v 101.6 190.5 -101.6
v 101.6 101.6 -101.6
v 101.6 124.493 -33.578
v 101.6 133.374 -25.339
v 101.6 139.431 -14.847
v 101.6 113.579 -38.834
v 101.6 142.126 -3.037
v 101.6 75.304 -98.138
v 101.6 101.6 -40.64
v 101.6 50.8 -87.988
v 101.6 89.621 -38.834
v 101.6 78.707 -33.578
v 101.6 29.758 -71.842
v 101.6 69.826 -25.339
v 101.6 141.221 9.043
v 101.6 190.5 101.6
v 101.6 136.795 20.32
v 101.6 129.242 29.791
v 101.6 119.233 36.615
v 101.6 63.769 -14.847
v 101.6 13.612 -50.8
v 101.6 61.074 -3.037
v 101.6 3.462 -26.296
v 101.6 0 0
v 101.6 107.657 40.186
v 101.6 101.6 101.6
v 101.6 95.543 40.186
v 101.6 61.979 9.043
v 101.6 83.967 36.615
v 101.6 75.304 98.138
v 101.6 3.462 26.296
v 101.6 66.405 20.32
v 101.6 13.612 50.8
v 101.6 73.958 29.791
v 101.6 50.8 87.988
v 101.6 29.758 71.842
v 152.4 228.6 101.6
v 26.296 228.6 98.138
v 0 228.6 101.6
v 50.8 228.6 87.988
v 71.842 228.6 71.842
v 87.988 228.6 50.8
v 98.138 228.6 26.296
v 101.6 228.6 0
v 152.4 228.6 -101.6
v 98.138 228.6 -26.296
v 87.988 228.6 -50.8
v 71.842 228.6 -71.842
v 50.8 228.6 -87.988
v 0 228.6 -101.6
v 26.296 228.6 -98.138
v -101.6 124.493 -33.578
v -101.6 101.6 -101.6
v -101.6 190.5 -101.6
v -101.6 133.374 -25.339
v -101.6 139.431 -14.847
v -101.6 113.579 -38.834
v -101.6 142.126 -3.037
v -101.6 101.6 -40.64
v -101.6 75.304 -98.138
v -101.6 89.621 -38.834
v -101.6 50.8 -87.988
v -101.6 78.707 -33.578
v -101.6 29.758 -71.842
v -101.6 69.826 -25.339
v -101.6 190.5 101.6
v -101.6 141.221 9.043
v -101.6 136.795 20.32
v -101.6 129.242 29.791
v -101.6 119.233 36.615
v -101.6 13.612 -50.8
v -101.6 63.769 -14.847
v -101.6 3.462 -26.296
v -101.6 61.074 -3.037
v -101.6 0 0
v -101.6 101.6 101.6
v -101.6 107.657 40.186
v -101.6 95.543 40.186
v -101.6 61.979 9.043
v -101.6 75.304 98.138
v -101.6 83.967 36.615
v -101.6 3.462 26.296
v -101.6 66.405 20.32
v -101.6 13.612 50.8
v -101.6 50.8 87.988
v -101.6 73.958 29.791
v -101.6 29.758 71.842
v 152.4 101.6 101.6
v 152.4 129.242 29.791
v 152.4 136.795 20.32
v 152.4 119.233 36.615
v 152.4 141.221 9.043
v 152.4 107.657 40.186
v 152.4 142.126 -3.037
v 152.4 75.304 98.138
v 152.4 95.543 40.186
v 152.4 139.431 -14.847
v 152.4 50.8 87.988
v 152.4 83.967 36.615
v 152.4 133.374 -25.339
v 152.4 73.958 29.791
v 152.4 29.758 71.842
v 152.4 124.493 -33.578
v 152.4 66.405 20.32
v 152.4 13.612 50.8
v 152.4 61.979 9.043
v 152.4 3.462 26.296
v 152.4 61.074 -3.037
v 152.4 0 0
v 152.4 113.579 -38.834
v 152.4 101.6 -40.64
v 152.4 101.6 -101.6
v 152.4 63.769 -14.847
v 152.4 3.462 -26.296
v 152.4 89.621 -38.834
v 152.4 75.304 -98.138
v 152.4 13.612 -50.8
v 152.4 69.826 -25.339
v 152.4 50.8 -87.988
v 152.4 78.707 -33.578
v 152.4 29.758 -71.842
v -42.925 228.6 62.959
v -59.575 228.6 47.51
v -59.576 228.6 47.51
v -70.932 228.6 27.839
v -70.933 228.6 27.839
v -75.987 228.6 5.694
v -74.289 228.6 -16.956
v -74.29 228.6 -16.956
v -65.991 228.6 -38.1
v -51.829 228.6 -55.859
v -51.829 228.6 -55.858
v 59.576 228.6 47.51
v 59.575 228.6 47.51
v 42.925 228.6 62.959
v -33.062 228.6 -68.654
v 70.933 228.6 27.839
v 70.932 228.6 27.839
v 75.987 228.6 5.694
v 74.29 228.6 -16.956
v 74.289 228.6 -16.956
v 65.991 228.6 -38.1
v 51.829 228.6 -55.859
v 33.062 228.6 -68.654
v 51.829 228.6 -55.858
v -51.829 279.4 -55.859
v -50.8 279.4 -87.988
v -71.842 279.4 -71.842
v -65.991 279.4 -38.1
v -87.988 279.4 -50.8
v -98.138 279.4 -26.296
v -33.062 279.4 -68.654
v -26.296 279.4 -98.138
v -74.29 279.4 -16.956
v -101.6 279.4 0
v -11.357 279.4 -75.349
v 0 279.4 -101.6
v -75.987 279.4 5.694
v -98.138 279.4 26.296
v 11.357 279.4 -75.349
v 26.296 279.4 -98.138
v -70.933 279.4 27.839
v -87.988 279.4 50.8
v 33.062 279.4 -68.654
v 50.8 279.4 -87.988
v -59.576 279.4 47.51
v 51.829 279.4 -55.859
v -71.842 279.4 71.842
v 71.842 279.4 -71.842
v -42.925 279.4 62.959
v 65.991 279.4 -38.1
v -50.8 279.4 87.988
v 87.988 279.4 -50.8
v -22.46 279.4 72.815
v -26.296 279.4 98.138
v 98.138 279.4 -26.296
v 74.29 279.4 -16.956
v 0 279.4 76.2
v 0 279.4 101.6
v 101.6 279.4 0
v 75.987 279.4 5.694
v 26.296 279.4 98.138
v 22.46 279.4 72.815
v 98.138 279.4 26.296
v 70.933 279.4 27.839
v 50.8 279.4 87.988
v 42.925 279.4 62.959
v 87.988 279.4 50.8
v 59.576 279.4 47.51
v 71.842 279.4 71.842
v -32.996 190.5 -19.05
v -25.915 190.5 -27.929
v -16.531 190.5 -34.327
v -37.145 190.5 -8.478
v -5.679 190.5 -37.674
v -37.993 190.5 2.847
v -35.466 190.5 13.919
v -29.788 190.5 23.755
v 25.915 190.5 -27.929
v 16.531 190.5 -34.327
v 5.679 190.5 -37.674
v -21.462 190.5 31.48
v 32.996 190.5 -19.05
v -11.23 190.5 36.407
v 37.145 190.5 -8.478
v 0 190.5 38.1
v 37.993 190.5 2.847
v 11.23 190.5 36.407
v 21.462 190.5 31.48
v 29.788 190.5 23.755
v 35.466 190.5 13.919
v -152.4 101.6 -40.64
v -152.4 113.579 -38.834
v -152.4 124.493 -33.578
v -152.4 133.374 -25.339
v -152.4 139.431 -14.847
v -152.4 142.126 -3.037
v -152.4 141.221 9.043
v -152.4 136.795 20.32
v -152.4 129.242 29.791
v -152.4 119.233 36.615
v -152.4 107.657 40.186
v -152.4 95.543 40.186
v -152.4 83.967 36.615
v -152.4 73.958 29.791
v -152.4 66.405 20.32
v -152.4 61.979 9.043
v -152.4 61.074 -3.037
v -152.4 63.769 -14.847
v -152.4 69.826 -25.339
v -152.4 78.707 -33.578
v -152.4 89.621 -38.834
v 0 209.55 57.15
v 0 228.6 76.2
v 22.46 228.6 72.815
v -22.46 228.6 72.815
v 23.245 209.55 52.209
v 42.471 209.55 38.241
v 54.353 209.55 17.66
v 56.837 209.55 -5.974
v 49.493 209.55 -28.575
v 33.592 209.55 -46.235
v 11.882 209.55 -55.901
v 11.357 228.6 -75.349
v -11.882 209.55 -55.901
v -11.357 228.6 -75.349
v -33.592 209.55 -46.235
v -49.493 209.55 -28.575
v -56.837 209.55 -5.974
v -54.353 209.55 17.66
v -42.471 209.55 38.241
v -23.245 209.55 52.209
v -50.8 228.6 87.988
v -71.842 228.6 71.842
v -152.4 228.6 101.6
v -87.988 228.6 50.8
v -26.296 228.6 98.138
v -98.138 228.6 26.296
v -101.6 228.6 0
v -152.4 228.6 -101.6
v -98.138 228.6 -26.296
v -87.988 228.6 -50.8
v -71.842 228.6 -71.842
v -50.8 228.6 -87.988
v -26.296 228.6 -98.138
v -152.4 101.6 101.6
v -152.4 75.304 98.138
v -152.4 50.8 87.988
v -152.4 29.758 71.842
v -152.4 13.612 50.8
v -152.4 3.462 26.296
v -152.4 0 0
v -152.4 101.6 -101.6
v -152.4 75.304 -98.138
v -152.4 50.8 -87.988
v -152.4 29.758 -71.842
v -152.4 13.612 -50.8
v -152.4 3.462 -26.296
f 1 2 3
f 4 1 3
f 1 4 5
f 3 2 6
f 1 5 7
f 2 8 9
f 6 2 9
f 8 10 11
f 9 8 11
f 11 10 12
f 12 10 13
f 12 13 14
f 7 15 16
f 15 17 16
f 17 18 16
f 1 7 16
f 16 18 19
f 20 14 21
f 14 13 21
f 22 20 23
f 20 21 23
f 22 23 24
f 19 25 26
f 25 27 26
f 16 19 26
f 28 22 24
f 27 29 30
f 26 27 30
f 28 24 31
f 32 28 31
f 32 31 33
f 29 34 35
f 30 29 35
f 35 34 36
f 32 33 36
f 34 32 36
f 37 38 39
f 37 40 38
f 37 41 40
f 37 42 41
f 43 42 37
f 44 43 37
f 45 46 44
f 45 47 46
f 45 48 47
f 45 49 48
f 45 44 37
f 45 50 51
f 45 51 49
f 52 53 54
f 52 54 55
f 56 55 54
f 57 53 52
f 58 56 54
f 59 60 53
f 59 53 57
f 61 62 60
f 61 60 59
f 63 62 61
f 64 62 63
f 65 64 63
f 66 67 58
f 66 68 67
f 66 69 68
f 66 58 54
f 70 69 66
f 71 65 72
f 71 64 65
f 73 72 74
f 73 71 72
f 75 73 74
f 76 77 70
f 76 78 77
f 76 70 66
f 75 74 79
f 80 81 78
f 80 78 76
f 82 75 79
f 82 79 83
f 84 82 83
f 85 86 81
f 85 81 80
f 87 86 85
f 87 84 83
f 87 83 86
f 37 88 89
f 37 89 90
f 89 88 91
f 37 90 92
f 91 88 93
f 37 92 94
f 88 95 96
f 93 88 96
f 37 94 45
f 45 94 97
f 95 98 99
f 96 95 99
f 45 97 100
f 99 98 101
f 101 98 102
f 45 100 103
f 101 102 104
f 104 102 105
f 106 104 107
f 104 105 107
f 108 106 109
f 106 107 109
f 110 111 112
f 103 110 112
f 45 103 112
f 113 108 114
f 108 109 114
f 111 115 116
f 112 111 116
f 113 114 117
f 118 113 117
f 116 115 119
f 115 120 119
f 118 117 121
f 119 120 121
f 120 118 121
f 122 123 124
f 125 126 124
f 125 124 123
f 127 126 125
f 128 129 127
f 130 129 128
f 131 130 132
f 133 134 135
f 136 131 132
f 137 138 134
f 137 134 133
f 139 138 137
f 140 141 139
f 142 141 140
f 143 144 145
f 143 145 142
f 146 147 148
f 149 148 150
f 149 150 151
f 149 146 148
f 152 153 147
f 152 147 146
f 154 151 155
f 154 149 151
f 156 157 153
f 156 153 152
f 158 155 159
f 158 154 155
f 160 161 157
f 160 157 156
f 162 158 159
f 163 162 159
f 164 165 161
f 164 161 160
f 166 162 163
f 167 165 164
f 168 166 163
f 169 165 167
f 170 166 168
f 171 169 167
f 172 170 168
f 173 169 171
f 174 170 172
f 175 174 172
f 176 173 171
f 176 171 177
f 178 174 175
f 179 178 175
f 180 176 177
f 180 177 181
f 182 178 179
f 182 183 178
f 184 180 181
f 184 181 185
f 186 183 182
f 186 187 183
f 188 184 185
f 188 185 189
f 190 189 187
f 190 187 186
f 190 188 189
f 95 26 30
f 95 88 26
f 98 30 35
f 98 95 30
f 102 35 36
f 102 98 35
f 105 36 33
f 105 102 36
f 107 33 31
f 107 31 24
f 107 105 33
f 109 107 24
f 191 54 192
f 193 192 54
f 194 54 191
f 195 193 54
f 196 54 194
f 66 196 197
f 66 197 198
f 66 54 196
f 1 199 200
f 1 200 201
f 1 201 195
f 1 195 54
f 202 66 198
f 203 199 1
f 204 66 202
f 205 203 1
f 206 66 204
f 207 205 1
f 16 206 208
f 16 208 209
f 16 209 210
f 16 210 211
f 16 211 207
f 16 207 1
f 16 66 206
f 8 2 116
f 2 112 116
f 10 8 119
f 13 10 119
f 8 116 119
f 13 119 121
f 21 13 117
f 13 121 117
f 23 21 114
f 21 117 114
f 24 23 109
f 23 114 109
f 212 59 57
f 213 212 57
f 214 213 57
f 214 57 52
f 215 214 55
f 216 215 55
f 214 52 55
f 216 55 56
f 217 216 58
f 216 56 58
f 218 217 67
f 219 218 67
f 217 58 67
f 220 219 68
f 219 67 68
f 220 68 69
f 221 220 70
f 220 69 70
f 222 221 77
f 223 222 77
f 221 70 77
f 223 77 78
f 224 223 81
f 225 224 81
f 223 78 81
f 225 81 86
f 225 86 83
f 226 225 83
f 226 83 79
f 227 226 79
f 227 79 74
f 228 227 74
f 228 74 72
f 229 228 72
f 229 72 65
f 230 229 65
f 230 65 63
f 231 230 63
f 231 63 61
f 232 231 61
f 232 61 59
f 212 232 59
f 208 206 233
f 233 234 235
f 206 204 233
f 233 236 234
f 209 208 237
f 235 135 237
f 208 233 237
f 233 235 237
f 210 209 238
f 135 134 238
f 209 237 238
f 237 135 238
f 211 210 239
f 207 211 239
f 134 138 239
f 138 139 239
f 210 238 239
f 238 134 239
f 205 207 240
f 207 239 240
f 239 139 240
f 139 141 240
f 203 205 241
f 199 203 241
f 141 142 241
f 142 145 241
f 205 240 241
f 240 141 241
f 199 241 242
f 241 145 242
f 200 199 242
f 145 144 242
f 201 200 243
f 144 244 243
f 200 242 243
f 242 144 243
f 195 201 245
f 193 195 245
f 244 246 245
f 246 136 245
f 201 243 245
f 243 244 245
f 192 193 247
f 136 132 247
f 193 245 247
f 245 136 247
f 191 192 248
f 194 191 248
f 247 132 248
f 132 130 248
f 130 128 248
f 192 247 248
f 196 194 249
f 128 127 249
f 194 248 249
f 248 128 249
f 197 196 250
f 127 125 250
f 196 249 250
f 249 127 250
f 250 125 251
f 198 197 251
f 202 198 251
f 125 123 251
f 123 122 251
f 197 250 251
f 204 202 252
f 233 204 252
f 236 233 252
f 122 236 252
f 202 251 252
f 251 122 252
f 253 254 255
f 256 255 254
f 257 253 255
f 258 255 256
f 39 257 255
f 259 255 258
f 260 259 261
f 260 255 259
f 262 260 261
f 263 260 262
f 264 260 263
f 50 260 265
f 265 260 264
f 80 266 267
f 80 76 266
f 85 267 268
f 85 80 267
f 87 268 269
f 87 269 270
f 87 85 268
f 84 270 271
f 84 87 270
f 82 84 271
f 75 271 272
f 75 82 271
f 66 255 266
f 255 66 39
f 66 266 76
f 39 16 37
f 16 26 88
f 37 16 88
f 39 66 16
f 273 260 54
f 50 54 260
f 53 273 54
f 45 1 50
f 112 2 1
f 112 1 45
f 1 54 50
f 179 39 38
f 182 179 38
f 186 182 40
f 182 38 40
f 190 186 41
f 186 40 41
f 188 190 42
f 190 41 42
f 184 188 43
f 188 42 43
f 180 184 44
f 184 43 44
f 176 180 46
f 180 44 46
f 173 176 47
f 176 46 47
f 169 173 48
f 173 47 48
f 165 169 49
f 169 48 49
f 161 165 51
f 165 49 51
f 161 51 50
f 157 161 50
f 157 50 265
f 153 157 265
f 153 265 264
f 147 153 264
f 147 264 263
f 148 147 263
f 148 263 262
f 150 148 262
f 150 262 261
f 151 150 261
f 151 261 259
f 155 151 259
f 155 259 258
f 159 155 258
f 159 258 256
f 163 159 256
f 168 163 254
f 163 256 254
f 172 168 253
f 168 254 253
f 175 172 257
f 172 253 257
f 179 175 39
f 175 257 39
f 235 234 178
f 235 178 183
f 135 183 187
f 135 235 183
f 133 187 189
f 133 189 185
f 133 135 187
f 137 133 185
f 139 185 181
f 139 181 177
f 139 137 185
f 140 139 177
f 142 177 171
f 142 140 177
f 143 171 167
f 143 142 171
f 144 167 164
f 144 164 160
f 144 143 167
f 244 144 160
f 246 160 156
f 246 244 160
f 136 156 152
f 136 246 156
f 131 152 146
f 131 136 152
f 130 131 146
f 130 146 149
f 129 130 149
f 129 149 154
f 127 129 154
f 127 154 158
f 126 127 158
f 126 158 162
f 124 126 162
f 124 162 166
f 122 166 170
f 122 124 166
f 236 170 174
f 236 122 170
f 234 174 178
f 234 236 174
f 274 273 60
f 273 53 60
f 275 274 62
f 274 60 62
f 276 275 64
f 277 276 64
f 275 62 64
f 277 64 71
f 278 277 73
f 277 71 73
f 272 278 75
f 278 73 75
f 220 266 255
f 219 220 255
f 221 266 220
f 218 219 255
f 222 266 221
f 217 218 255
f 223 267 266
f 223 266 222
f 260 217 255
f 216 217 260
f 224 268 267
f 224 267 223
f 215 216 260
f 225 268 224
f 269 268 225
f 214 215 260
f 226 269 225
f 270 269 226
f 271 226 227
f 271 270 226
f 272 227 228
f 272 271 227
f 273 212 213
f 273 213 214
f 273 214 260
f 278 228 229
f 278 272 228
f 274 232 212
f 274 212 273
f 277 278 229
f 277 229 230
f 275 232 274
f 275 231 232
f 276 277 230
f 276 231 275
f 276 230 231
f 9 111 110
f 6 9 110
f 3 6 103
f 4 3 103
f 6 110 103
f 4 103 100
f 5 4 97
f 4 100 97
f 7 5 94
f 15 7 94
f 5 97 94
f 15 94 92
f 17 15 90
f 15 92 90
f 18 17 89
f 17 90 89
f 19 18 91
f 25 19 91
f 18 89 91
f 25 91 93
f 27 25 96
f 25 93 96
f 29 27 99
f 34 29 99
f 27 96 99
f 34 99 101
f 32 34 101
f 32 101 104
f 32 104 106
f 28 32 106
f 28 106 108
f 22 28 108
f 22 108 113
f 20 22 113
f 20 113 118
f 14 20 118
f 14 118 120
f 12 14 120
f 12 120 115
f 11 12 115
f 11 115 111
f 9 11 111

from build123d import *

# Parameters (mm, degrees)
SKETCH1_W           = 304.8
SKETCH1_H           = 203.2
BOSS_EXTRUDE1_DEPTH = 228.6
SKETCH2_R           = 101.6
SKETCH2_R_2         = 76.2
BOSS_EXTRUDE2_DEPTH = 50.8
SKETCH3_R           = 38.1
CUT_EXTRUDE1_DEPTH  = 38.1
SKETCH4_W           = 203.2
SKETCH4_H           = 203.2
CUT_EXTRUDE2_DEPTH  = 190.5
SKETCH5_R           = 40.64
CUT_EXTRUDE3_DEPTH  = 304.8
FILLET1_R           = 101.6
CHAMFER1_SIZE       = 38.1


with BuildPart() as part:
    # Sketch1 → Boss-Extrude1 (new body)
    with BuildSketch(Plane(origin=(0, 0, 0), x_dir=(1, 0, 0), z_dir=(0, 1, 0))):
        Rectangle(SKETCH1_W, SKETCH1_H)
    extrude(amount=BOSS_EXTRUDE1_DEPTH)

    # Sketch2 → Boss-Extrude2 (add)
    with BuildSketch(Plane(origin=(0, 228.6, 0), x_dir=(1, 0, 0), z_dir=(0, 1, 0))):
        with Locations(Location((0, 0, 0), (0, 0, 270))):
            Circle(SKETCH2_R)
        with Locations(Location((0, 0, 0), (0, 0, 270))):
            Circle(SKETCH2_R_2, mode=Mode.SUBTRACT)
    extrude(amount=BOSS_EXTRUDE2_DEPTH)

    # Sketch3 → Cut-Extrude1 (cut)
    with BuildSketch(Plane(origin=(0, 228.6, 0), x_dir=(1, 0, 0), z_dir=(0, 1, 0))):
        with Locations(Location((0, 0, 0), (0, 0, 270))):
            Circle(SKETCH3_R)
    extrude(amount=-CUT_EXTRUDE1_DEPTH, mode=Mode.SUBTRACT)

    # Sketch4 → Cut-Extrude2 (cut)
    with BuildSketch(Plane.XZ):
        Rectangle(SKETCH4_W, SKETCH4_H)
    extrude(amount=-CUT_EXTRUDE2_DEPTH, mode=Mode.SUBTRACT)

    # Sketch5 → Cut-Extrude3 (cut)
    with BuildSketch(Plane(origin=(152.4, 0, 0), x_dir=(0, 0, -1), z_dir=(1, 0, 0))):
        with Locations((0, 101.6)):
            Circle(SKETCH5_R)
    extrude(amount=-CUT_EXTRUDE3_DEPTH, mode=Mode.SUBTRACT)

    # Fillet1
    fillet1_edges = [part.edges().sort_by_distance(p)[0] for p in [
        (127, 0, -101.6),
        (127, 0, 101.6),
        (-127, 0, -101.6),
        (-127, 0, 101.6),
    ]]
    fillet(fillet1_edges, radius=FILLET1_R - 0.0001)  # a hair under: the kernel refuses the full size

    # Chamfer1
    chamfer1_edges = [part.edges().sort_by_distance(p)[0] for p in [
        (0, 228.6, -38.1),
    ]]
    chamfer(chamfer1_edges, length=CHAMFER1_SIZE - 0.0001)  # a hair under: the kernel refuses the full size


solid = part.part
